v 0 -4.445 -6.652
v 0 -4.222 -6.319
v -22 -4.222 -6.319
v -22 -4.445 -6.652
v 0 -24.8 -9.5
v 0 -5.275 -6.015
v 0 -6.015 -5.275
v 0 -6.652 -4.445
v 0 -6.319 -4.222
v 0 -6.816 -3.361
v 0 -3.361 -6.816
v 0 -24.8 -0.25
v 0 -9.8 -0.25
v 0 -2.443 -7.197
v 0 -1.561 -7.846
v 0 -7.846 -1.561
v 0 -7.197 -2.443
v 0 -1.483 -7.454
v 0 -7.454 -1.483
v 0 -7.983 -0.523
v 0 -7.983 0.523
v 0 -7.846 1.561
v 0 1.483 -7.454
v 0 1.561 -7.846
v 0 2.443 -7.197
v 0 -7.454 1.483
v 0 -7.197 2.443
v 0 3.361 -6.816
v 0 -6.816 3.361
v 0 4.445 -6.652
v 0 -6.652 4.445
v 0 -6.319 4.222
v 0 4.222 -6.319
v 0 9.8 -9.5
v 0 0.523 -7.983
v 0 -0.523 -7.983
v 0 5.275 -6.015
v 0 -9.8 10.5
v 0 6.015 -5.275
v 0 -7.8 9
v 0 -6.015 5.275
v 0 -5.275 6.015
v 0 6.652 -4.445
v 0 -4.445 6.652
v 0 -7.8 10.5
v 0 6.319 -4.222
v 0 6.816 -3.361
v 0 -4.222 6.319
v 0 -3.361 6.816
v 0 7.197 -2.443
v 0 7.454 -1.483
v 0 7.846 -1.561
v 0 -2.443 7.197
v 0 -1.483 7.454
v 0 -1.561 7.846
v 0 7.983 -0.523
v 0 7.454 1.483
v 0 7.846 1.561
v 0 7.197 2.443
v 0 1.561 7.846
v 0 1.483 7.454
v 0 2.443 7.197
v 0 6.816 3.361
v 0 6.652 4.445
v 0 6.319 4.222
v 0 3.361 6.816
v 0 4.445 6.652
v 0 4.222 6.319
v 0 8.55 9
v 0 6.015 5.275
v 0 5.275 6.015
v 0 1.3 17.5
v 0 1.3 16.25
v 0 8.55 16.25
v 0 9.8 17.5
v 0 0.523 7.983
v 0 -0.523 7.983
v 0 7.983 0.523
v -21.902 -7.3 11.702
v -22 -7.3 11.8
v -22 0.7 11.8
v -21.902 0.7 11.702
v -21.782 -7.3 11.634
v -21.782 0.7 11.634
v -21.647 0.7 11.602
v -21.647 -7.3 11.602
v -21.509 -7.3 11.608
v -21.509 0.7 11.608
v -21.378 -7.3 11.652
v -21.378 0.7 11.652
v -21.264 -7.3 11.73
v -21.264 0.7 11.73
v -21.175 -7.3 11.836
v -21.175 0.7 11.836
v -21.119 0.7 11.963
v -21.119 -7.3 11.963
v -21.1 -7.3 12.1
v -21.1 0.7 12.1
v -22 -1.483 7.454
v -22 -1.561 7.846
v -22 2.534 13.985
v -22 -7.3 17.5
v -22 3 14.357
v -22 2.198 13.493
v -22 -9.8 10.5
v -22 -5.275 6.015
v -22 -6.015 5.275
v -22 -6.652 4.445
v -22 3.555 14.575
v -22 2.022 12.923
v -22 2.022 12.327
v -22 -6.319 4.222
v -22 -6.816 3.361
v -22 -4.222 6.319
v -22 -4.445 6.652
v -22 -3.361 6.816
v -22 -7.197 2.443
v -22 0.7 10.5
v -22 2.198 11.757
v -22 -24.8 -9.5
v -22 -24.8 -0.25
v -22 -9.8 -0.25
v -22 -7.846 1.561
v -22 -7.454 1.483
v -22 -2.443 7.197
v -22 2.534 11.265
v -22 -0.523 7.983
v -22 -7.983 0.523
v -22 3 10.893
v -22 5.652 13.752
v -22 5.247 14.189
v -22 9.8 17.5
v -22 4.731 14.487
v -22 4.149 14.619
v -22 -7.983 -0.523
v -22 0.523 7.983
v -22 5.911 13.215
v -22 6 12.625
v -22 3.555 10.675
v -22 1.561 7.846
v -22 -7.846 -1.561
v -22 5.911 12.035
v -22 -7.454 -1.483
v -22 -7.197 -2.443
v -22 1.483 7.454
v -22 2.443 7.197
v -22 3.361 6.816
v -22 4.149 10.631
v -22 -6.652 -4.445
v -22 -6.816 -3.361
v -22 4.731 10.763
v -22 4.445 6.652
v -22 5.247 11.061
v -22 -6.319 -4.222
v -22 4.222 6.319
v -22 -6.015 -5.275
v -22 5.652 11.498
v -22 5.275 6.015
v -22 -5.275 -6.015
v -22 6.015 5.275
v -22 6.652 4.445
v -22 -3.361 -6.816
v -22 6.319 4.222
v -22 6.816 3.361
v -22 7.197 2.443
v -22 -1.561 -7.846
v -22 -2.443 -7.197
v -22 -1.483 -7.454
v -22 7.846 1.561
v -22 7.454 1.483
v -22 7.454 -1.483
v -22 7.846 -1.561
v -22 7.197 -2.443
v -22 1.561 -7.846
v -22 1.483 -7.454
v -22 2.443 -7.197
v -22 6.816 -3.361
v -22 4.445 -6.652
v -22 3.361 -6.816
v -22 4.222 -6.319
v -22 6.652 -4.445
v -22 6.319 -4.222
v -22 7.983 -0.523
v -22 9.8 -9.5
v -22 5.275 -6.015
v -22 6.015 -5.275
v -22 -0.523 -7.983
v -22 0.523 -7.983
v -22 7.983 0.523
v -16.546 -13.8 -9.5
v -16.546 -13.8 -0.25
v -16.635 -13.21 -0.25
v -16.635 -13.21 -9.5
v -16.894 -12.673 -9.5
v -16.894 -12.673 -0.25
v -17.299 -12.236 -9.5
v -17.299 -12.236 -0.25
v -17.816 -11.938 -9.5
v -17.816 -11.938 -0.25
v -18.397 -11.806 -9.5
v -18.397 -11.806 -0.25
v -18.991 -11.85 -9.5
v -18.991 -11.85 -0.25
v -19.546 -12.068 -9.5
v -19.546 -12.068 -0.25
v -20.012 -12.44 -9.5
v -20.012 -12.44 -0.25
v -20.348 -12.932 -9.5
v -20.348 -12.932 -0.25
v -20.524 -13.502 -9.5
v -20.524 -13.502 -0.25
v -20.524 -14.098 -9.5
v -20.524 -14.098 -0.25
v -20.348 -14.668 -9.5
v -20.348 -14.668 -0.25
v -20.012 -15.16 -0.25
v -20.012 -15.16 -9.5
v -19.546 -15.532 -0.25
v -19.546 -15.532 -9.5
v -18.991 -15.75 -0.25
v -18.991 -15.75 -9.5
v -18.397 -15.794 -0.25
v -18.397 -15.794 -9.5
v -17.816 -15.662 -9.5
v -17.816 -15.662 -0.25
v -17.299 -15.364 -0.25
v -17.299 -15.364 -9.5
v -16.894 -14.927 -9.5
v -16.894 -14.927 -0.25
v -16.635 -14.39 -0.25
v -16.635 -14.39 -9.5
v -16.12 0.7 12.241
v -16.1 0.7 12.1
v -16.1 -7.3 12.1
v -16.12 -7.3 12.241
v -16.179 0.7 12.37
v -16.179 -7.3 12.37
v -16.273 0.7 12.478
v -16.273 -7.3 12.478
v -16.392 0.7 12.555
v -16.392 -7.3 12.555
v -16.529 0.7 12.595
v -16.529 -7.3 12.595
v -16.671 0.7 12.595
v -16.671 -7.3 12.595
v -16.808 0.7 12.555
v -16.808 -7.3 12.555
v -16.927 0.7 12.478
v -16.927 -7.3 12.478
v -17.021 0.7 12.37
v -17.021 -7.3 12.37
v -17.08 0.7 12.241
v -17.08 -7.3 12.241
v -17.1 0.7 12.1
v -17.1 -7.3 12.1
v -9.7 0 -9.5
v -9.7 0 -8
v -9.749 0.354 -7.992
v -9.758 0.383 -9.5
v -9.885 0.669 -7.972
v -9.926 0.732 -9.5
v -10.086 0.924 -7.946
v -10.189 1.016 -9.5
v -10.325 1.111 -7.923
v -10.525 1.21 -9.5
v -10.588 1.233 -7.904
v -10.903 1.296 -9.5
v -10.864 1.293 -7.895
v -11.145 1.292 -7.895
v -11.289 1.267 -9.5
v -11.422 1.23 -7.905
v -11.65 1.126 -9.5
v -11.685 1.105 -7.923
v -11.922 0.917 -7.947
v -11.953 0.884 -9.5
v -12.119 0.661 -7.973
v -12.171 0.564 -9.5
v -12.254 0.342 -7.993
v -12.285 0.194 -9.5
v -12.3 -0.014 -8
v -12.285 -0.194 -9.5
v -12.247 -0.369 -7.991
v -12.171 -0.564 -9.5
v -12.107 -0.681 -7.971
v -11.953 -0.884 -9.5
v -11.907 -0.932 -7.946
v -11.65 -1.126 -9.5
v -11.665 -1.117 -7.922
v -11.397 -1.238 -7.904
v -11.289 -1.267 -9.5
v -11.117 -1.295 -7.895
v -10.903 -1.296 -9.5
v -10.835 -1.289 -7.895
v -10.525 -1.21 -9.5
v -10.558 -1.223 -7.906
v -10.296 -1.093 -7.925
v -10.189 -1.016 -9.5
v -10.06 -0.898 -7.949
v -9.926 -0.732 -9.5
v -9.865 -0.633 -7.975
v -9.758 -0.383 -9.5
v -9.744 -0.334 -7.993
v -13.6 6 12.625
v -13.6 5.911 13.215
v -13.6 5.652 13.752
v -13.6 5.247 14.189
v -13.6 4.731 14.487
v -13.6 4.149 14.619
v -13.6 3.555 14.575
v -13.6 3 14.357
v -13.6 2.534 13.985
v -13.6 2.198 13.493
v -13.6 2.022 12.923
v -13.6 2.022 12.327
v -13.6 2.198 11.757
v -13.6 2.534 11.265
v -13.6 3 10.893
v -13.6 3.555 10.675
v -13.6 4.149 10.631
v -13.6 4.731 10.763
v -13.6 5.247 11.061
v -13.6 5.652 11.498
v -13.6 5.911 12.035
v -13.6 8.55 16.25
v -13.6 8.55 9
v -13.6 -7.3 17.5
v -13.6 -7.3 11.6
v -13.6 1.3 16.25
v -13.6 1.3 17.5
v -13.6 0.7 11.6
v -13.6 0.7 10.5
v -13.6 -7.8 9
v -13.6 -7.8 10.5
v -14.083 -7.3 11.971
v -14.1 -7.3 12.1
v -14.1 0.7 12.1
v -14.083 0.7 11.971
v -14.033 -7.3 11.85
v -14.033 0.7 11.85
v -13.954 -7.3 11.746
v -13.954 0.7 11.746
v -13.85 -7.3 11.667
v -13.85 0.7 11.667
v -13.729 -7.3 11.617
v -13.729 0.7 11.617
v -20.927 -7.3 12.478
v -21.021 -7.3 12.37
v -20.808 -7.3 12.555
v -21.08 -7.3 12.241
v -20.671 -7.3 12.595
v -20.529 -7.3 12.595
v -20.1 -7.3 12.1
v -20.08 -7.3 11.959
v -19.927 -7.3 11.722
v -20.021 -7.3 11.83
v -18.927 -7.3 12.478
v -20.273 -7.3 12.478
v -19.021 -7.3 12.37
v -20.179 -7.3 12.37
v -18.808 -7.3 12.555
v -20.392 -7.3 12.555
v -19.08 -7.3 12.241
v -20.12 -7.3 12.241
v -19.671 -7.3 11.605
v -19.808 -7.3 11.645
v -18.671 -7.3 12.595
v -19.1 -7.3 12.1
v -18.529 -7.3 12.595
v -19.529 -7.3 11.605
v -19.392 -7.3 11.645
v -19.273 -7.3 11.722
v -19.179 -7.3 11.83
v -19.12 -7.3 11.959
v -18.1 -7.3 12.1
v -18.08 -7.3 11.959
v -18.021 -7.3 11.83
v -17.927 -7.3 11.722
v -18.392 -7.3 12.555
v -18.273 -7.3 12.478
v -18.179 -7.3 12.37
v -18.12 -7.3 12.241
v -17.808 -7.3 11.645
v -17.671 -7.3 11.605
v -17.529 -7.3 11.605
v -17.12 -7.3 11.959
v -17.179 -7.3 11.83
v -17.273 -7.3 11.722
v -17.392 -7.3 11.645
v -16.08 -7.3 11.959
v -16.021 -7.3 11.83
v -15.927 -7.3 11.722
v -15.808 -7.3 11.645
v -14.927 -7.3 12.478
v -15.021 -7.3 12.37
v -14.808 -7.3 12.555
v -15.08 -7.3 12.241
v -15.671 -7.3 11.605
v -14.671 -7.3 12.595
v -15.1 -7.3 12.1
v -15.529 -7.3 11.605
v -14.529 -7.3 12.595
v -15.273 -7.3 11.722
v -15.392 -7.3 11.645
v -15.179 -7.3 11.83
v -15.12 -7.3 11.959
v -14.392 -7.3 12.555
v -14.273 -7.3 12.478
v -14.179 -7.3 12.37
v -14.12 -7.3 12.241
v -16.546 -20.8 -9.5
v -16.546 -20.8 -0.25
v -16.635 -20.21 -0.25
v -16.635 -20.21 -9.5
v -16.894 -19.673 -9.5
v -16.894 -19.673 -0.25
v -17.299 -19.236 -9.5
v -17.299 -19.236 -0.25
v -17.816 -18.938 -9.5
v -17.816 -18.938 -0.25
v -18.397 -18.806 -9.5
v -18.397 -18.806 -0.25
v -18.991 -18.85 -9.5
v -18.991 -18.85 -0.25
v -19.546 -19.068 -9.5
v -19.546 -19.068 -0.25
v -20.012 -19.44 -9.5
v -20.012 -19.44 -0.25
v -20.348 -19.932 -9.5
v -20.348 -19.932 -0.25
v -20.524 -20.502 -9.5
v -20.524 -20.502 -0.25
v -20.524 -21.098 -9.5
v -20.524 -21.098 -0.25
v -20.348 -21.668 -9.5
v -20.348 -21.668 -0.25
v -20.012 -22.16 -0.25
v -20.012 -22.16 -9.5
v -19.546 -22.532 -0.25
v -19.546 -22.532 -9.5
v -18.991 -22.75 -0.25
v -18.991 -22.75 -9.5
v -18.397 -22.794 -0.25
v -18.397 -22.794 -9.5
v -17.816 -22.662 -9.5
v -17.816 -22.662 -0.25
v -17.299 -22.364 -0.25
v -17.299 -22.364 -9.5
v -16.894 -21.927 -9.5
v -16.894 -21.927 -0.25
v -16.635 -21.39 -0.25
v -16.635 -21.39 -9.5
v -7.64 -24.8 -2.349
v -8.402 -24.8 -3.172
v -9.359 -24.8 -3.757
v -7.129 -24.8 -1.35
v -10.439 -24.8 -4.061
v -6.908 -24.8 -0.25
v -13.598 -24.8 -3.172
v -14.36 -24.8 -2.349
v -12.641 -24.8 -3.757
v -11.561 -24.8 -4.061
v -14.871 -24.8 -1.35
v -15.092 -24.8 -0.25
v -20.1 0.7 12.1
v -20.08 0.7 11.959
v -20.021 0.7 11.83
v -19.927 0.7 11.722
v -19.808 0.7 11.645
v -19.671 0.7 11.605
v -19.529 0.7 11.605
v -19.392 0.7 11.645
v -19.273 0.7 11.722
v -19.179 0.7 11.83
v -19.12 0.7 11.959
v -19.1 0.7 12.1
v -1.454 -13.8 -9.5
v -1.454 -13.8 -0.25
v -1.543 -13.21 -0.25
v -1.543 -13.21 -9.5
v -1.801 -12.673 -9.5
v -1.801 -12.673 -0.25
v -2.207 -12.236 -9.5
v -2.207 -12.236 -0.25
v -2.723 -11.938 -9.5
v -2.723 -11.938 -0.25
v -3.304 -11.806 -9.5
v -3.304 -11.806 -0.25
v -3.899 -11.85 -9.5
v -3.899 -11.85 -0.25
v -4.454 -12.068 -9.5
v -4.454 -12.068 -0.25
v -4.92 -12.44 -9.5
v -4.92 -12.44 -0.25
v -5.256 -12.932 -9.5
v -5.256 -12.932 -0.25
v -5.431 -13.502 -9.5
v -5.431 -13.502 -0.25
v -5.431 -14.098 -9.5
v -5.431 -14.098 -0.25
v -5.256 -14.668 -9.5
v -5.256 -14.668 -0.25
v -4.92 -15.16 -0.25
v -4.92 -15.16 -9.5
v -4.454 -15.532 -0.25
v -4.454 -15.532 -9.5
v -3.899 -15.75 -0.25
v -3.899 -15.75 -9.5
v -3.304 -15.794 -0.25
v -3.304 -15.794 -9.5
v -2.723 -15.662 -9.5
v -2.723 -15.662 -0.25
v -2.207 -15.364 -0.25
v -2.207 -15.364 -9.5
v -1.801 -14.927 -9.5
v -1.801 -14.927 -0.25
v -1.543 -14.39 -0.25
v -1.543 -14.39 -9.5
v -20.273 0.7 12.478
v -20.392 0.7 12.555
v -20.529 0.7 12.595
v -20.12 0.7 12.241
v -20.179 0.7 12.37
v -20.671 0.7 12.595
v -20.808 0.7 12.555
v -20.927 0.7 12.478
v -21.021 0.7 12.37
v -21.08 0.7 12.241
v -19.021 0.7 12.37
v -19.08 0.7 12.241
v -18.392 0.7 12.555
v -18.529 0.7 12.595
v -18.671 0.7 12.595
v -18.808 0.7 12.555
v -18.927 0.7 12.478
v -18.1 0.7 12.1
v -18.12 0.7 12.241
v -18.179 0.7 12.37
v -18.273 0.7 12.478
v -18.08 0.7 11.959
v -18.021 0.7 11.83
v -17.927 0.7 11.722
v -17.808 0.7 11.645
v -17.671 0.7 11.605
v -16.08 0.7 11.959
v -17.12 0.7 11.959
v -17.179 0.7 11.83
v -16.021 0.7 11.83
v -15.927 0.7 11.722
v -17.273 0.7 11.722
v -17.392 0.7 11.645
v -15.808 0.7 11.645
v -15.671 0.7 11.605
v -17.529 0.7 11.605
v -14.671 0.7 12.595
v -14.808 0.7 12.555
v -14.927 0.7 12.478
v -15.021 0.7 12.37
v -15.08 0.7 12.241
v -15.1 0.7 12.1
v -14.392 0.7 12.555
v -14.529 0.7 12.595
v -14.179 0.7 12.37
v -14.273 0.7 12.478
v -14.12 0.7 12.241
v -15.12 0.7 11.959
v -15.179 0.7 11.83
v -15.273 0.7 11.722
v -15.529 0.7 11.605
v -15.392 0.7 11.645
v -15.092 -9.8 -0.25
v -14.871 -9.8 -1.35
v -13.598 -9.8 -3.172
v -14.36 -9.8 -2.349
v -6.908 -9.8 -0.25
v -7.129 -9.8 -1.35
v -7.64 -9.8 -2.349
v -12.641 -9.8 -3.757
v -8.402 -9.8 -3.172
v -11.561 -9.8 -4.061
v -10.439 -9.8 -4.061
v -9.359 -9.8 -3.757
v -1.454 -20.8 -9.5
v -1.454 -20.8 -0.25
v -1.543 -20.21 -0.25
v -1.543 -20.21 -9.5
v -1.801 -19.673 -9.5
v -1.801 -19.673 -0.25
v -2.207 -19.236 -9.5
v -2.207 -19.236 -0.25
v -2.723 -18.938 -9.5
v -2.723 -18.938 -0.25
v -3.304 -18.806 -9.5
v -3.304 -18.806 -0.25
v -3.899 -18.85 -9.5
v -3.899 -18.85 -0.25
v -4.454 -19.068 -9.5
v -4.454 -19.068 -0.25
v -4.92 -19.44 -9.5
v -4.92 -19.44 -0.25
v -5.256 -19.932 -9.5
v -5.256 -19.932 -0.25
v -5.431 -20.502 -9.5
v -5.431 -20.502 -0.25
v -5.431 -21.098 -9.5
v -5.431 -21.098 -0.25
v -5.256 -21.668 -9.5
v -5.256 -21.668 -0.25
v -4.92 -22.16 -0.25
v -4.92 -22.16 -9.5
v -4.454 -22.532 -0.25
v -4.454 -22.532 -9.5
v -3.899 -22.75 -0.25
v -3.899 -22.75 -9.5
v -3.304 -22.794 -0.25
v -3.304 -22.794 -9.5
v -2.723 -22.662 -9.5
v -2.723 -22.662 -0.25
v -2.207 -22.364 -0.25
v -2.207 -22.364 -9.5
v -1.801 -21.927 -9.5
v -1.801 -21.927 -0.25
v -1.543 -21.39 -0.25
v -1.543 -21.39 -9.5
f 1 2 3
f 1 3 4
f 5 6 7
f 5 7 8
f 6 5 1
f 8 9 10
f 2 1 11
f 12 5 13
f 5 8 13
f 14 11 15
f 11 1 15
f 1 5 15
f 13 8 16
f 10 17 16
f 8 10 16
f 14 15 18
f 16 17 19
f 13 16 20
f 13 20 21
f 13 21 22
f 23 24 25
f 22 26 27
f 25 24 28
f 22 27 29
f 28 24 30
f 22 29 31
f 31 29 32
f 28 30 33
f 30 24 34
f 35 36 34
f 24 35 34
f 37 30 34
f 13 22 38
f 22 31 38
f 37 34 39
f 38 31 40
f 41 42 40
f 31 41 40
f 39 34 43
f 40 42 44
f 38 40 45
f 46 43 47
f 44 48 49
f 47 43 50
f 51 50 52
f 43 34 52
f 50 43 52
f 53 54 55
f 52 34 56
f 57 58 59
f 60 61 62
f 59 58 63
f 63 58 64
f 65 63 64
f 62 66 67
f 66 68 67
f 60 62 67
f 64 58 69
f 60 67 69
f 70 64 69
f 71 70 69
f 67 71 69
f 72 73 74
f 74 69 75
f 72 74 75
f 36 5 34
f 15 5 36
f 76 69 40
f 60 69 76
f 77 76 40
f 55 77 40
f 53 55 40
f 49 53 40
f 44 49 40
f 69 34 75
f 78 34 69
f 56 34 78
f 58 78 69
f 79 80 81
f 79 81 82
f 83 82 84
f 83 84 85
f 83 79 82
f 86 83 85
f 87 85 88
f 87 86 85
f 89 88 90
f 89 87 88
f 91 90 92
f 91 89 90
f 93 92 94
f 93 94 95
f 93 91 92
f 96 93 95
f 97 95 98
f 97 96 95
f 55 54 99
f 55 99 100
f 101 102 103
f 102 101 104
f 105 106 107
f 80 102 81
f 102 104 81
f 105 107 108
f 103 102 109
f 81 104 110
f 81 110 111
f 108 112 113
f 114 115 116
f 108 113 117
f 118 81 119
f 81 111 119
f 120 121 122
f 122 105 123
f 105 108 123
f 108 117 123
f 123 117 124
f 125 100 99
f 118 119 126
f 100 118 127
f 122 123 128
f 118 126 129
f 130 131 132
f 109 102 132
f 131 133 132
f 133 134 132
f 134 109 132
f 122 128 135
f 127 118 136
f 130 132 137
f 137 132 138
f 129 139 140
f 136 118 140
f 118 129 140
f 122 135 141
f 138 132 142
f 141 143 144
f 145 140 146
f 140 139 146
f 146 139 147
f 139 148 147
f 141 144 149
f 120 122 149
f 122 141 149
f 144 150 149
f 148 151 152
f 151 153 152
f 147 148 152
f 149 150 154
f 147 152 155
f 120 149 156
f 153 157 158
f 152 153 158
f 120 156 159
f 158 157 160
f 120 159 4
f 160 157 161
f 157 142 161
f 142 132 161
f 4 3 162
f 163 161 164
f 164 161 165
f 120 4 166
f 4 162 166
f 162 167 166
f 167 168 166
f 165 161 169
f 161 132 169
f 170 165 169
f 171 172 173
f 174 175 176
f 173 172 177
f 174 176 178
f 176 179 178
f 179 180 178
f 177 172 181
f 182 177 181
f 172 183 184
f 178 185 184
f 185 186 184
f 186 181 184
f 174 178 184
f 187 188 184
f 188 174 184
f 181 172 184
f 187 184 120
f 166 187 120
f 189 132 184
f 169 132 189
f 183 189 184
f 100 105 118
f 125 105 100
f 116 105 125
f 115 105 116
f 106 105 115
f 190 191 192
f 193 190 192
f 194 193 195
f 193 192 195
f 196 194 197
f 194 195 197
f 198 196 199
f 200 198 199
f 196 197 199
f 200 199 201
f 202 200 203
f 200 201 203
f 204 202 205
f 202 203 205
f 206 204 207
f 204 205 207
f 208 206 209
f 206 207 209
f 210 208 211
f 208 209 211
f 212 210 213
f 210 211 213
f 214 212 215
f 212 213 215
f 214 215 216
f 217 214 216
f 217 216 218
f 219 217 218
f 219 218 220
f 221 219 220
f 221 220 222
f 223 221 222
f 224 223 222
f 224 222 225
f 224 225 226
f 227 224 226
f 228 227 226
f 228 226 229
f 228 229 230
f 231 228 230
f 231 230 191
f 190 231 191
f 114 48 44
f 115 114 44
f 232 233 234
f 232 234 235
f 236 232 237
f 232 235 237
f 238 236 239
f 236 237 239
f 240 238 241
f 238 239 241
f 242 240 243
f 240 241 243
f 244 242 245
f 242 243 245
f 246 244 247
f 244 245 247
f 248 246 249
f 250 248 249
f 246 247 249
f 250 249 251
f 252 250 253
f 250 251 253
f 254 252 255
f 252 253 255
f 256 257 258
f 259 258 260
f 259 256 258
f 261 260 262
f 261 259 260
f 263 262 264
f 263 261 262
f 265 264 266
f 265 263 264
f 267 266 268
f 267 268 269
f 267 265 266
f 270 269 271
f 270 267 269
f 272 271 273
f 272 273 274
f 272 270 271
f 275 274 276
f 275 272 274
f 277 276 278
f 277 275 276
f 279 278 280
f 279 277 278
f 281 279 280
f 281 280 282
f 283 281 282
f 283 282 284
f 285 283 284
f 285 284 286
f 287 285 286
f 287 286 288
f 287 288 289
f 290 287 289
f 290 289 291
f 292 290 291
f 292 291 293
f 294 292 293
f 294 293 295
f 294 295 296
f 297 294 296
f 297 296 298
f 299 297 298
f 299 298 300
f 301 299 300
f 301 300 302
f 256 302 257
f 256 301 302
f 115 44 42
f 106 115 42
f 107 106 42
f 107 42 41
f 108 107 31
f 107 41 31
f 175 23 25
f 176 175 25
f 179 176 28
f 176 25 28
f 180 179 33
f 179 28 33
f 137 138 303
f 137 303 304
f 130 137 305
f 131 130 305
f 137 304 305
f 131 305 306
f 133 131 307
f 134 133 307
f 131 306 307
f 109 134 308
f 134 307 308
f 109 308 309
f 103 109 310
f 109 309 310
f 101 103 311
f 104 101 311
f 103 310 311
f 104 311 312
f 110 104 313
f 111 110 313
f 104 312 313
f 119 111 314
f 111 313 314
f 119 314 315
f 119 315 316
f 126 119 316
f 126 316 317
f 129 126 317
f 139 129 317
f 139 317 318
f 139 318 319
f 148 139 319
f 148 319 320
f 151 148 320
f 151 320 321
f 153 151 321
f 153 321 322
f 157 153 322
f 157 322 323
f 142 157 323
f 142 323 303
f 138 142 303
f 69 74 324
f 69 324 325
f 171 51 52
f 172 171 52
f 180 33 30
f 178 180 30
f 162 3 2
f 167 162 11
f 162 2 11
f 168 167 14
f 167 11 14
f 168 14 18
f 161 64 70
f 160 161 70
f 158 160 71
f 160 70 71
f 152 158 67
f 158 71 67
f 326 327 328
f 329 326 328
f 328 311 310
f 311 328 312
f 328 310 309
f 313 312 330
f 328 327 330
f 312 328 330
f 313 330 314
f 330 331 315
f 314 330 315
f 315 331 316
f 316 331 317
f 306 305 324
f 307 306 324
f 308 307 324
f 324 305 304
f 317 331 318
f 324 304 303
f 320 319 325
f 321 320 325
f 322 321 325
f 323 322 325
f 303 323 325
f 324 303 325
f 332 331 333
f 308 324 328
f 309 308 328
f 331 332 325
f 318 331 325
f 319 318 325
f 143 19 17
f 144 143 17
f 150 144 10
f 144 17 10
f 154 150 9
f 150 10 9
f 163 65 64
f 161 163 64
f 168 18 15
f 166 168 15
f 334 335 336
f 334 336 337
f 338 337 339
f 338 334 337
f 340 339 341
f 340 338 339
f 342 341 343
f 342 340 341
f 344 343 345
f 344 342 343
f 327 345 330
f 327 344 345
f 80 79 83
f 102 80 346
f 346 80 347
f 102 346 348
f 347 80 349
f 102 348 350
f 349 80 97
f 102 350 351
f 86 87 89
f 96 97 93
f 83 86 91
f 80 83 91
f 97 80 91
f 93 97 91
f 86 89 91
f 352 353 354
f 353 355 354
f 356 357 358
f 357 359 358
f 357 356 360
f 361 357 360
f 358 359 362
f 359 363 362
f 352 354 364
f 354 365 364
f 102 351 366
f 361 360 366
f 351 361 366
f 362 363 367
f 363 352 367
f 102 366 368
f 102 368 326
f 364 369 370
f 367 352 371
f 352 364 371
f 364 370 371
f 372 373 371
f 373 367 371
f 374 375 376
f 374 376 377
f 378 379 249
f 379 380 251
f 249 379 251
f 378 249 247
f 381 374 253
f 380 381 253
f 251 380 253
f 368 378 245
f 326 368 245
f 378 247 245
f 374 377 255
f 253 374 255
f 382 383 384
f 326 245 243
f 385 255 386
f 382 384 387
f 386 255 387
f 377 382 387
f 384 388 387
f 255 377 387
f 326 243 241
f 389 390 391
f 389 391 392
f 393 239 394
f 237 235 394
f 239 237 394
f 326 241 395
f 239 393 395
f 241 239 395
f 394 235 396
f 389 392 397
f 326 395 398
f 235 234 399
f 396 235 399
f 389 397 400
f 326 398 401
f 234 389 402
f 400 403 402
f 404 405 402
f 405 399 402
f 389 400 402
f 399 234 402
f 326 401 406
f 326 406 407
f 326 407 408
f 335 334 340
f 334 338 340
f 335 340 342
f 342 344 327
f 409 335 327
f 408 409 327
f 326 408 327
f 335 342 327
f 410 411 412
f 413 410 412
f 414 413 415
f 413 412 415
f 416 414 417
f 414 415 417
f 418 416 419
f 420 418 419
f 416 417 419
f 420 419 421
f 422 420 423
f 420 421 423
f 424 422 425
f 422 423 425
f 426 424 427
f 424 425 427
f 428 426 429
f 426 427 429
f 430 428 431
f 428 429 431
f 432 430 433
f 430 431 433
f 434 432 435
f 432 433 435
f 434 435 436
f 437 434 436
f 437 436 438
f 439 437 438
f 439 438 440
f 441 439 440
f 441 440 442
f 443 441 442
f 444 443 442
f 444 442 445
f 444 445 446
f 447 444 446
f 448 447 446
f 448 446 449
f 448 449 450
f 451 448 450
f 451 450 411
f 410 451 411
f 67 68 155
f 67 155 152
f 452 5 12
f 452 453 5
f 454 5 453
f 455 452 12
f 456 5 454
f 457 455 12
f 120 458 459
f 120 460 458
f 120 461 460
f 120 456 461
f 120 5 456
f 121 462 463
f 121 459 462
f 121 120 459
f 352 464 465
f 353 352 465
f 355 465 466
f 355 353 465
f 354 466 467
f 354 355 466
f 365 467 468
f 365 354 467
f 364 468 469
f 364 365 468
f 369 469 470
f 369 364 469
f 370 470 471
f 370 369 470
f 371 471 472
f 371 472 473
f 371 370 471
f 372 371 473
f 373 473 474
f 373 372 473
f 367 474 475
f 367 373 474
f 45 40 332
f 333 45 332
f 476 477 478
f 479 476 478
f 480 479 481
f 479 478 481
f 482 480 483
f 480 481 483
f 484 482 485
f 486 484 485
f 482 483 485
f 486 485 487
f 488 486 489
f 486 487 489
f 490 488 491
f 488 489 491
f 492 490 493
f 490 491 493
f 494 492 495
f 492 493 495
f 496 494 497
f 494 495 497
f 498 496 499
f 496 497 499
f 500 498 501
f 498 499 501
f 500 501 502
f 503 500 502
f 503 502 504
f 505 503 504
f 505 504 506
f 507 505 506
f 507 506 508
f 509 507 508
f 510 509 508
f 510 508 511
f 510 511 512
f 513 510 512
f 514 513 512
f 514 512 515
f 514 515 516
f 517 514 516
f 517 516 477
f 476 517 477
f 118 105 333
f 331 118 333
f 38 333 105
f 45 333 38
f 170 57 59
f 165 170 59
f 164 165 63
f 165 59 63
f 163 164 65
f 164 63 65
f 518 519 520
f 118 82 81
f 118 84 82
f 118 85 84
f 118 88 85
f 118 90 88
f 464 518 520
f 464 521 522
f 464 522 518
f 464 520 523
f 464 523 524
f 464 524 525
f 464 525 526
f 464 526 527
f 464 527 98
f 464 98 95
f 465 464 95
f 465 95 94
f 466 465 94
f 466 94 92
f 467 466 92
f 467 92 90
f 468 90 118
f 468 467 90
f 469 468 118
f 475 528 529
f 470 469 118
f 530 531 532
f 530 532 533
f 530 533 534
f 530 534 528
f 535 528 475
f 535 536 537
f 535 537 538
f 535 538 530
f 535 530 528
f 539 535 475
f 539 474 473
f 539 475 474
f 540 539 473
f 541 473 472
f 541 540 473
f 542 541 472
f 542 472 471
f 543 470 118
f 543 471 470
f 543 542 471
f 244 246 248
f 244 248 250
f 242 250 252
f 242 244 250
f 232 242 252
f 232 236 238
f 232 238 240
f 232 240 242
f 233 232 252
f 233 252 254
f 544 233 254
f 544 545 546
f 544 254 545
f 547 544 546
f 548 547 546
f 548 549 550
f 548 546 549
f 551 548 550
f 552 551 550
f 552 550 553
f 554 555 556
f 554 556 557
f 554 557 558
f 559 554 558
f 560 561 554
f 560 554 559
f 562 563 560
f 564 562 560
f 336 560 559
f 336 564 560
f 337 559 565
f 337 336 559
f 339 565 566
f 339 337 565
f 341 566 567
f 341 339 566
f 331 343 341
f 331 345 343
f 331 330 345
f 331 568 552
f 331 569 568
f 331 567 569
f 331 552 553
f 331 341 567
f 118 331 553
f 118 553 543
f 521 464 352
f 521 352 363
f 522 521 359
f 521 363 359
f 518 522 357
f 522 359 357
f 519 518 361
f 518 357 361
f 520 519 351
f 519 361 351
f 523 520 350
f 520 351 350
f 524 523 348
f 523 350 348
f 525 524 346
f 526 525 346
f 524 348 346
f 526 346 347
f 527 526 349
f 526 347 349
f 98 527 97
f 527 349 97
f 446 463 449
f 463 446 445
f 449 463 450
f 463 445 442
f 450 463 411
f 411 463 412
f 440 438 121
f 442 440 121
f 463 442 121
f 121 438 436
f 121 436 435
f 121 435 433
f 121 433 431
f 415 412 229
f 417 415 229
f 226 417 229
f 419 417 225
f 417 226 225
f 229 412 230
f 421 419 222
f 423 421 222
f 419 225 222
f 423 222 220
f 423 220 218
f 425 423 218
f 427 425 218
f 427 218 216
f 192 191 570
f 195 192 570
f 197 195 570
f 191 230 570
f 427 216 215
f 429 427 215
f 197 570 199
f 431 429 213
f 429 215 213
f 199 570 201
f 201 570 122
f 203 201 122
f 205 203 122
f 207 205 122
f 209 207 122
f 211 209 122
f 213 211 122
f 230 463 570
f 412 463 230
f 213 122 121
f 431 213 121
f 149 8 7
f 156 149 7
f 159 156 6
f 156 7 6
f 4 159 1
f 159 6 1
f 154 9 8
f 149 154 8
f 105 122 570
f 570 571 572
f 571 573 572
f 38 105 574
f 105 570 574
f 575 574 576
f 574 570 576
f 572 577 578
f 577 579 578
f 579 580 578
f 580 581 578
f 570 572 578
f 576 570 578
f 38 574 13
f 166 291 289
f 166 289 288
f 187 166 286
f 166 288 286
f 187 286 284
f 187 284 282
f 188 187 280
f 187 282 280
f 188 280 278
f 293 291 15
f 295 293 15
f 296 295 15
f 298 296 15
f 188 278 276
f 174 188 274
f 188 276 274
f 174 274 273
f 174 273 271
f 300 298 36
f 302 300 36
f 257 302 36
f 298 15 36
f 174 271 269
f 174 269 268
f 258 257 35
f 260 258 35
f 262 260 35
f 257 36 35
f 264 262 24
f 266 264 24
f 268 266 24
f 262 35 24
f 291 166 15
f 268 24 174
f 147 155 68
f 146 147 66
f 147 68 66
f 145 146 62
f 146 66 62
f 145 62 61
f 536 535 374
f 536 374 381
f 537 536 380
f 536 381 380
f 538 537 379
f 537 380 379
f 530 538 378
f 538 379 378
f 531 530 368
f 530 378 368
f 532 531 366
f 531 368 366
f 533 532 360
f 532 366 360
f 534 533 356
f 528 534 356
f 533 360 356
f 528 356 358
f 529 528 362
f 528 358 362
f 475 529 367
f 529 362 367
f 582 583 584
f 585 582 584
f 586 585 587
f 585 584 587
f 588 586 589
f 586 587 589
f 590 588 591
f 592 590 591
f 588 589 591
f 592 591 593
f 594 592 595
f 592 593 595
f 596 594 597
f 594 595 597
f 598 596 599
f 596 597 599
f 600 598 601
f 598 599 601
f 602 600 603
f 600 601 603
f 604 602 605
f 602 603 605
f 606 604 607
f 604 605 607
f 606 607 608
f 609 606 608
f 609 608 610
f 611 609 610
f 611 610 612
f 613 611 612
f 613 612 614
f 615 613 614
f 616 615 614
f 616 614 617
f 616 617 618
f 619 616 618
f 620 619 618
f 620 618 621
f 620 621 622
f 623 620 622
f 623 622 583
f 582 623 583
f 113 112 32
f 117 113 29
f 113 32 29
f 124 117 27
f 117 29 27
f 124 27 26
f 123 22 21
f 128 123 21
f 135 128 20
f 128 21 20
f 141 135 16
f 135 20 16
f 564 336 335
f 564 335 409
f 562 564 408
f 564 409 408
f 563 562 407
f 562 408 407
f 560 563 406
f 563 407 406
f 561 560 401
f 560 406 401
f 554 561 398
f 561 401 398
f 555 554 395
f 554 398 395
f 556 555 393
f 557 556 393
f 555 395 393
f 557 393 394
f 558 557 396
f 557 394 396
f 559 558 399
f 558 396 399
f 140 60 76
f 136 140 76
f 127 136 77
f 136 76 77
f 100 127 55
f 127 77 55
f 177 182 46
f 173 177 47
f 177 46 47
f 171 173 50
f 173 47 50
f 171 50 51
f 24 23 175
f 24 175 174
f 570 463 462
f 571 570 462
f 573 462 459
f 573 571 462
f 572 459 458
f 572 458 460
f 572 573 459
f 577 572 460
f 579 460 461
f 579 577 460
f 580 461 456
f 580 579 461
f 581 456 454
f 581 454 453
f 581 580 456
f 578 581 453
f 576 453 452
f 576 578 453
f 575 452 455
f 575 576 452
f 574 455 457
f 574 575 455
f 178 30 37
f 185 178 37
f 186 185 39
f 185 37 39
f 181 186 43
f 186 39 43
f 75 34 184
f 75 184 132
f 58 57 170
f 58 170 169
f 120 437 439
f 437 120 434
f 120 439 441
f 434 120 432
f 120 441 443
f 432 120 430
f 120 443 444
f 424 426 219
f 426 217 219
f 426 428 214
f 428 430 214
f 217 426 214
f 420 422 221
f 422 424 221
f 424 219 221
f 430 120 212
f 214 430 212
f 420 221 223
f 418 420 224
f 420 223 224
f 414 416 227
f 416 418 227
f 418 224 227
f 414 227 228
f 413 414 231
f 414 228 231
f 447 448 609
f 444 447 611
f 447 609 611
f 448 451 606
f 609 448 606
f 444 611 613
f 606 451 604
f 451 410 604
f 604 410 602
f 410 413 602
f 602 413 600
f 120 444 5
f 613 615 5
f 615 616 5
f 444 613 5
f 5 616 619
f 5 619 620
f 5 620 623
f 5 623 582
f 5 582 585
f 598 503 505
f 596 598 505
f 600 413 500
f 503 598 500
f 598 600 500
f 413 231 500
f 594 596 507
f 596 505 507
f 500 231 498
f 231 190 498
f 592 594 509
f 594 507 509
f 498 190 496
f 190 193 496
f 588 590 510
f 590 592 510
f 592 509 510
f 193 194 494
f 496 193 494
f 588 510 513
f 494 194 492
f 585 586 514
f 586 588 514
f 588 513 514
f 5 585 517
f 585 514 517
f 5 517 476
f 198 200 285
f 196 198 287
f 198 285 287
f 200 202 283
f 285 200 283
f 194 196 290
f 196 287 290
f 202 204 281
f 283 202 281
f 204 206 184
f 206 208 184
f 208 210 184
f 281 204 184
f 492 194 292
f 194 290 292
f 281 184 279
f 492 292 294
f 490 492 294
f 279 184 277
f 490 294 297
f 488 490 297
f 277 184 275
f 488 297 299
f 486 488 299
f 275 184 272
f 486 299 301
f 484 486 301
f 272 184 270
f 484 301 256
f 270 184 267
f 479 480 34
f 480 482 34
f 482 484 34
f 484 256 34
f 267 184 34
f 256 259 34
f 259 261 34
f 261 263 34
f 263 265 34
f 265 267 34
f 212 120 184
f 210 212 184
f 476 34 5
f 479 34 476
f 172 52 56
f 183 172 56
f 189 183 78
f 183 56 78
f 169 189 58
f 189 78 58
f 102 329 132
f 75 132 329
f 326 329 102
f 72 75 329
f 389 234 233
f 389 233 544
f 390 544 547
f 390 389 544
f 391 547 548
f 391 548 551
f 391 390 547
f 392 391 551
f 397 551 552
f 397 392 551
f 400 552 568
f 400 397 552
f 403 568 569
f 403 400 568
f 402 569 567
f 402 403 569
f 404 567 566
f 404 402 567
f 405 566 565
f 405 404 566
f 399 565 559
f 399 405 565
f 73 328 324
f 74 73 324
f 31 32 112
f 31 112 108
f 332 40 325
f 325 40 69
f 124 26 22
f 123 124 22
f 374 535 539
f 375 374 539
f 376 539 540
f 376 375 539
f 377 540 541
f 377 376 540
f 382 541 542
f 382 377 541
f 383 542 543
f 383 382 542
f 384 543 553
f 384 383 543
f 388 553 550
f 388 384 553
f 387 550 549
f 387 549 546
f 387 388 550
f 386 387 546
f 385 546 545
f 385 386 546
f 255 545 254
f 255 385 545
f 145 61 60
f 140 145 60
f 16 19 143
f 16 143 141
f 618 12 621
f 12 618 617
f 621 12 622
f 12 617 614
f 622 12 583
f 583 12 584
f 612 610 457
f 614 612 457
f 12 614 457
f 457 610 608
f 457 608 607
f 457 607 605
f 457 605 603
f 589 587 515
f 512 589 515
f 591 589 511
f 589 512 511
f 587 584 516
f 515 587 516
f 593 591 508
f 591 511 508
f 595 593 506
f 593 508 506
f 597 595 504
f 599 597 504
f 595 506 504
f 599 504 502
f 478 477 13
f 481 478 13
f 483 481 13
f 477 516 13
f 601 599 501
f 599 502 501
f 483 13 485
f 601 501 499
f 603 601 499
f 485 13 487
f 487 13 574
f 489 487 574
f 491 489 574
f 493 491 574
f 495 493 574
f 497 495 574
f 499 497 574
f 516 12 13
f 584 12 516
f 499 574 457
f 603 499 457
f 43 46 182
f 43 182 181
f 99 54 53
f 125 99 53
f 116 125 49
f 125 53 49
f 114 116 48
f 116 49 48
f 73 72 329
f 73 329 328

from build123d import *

# Parameters (mm, degrees)
PAD015_DEPTH       = 15
SKETCH034_R        = 2
POCKET016_DEPTH    = 9.501
SKETCH_W           = 19.6
SKETCH_H           = 18.5
SKETCH_R           = 7.6
PAD_DEPTH          = 22
SKETCH002_W        = 17.1
SKETCH002_H        = 8.4
PAD001_DEPTH       = 8.5
POCKET_DEPTH       = 8
PAD002_DEPTH       = 13.6
SKETCH005_R        = 2
POCKET001_DEPTH    = 22.001
POCKET002_DEPTH    = 101.929968
POLARPATTERN_COUNT = 8
PAD004_DEPTH       = 1.5
SKETCH041_R        = 1.3
POCKET020_DEPTH    = 5


with BuildPart() as body026:
    # Sketch033 (on DatumPlane) → Pad015 (new body)
    with BuildSketch(Plane(origin=(0, -9.8, 0), x_dir=(0, 0, 1), z_dir=(0, -1, 0))):
        with BuildLine():
            Line((-9.5, 0), (-0.25, 0))
            Line((-0.25, 0), (-0.25, 6.907629))
            ThreePointArc((-0.25, 15.092371), (-4.1, 11), (-0.25, 6.907629))
            Line((-0.25, 15.092371), (-0.25, 22))
            Line((-0.25, 22), (-9.5, 22))
            Line((-9.5, 22), (-9.5, 0))
        make_face()
    extrude(amount=PAD015_DEPTH)

    # Sketch034 → Pocket016 (cut, through all)
    with BuildSketch(Plane.XY):
        with Locations((-18.546185, -13.8)):
            Circle(SKETCH034_R)
        with Locations((-3.453815, -13.8)):
            Circle(SKETCH034_R)
        with Locations((-3.453815, -20.8)):
            Circle(SKETCH034_R)
        with Locations((-18.546185, -20.8)):
            Circle(SKETCH034_R)
    extrude(amount=-POCKET016_DEPTH, mode=Mode.SUBTRACT)


with BuildPart() as printable_axisholder_y_fusion:
    # Sketch → Pad (new body)
    with BuildSketch(Plane.YZ):
        with Locations((0, -0.25)):
            Rectangle(SKETCH_W, SKETCH_H)
        Circle(SKETCH_R, mode=Mode.SUBTRACT)
    extrude(amount=-PAD_DEPTH)

    # Sketch002 → Pad001 (join)
    with BuildSketch(Plane(origin=(0, 0, 9), x_dir=(0, -1, 0), z_dir=(0, 0, 1))):
        with Locations((-1.25, -17.8)):
            Rectangle(SKETCH002_W, SKETCH002_H)
    extrude(amount=PAD001_DEPTH)

    # Sketch003 → Pocket (cut)
    with BuildSketch(Plane(origin=(0, -7.3, 0), x_dir=(0, 0, -1), z_dir=(0, -1, 0))):
        with BuildLine():
            Line((-10.5, -22), (-10.5, -13.6))
            Line((-10.5, -13.6), (-11.6, -13.6))
            ThreePointArc((-12.1, -14.1), (-11.746447, -13.953553), (-11.6, -13.6))
            ThreePointArc((-12.1, -14.1), (-12.6, -14.6), (-12.1, -15.1))
            ThreePointArc((-12.1, -16.1), (-11.6, -15.6), (-12.1, -15.1))
            ThreePointArc((-12.1, -16.1), (-12.6, -16.6), (-12.1, -17.1))
            ThreePointArc((-12.1, -18.1), (-11.6, -17.6), (-12.1, -17.1))
            ThreePointArc((-12.1, -18.1), (-12.6, -18.6), (-12.1, -19.1))
            ThreePointArc((-12.1, -20.1), (-11.6, -19.6), (-12.1, -19.1))
            ThreePointArc((-12.1, -20.1), (-12.6, -20.6), (-12.1, -21.1))
            ThreePointArc((-11.8, -22), (-11.625658, -21.441886), (-12.1, -21.1))
            Line((-11.8, -22), (-10.5, -22))
        make_face()
    extrude(amount=-POCKET_DEPTH, mode=Mode.SUBTRACT)

    # Sketch004 (on DatumPlane) → Pad002 (join)
    with BuildSketch(Plane.YZ):
        Polygon((9.8, 17.5), (1.3, 17.5), (1.3, 16.25), (8.55, 16.25), (8.55, 9), (9.8, 9), align=None)
    extrude(amount=-PAD002_DEPTH)

    # Sketch005 (on DatumPlane) → Pocket001 (cut, through all)
    with BuildSketch(Plane.YZ):
        with Locations((4, 12.625)):
            Circle(SKETCH005_R)
    extrude(amount=-POCKET001_DEPTH, mode=Mode.SUBTRACT)

    # Sketch006 (on DatumPlane) → Pocket002 (cut, through all)
    with BuildSketch(Plane.YZ):
        with BuildLine():
            ThreePointArc((-7.846282, 1.560723), (-8, 0), (-7.846282, -1.560723))
            Line((-6.708571, -1.334418), (-7.846282, -1.560723))
            ThreePointArc((-6.708571, 1.334418), (-6.84, 0), (-6.708571, -1.334418))
            Line((-6.708571, 1.334418), (-7.846282, 1.560723))
        make_face()
    pocket002 = extrude(amount=-POCKET002_DEPTH, mode=Mode.SUBTRACT)

    # PolarPattern: Pocket002 ×8 about axis
    polarpattern_axis = Axis((0, 0, 0), (1, 0, 0))
    for i in range(1, POLARPATTERN_COUNT):
        add(pocket002.rotate(polarpattern_axis, i * 360 / POLARPATTERN_COUNT), mode=Mode.SUBTRACT)

    # Sketch010 (on DatumPlane) → Pad004 (join)
    with BuildSketch(Plane.XY.offset(9)):
        Polygon((0, -7.8), (-13.6, -7.8), (-13.6, -7.3), (-22, -7.3), (-22, -9.8), (0, -9.8), align=None)
    extrude(amount=PAD004_DEPTH)

    # Sketch041 → Pocket020 (cut)
    with BuildSketch(Plane.XY.offset(-9.5)):
        with Locations((-11, 0)):
            Circle(SKETCH041_R)
    extrude(amount=POCKET020_DEPTH, mode=Mode.SUBTRACT)

    # Fusion001: union Body026
    add(body026.part)


solid = printable_axisholder_y_fusion.part
